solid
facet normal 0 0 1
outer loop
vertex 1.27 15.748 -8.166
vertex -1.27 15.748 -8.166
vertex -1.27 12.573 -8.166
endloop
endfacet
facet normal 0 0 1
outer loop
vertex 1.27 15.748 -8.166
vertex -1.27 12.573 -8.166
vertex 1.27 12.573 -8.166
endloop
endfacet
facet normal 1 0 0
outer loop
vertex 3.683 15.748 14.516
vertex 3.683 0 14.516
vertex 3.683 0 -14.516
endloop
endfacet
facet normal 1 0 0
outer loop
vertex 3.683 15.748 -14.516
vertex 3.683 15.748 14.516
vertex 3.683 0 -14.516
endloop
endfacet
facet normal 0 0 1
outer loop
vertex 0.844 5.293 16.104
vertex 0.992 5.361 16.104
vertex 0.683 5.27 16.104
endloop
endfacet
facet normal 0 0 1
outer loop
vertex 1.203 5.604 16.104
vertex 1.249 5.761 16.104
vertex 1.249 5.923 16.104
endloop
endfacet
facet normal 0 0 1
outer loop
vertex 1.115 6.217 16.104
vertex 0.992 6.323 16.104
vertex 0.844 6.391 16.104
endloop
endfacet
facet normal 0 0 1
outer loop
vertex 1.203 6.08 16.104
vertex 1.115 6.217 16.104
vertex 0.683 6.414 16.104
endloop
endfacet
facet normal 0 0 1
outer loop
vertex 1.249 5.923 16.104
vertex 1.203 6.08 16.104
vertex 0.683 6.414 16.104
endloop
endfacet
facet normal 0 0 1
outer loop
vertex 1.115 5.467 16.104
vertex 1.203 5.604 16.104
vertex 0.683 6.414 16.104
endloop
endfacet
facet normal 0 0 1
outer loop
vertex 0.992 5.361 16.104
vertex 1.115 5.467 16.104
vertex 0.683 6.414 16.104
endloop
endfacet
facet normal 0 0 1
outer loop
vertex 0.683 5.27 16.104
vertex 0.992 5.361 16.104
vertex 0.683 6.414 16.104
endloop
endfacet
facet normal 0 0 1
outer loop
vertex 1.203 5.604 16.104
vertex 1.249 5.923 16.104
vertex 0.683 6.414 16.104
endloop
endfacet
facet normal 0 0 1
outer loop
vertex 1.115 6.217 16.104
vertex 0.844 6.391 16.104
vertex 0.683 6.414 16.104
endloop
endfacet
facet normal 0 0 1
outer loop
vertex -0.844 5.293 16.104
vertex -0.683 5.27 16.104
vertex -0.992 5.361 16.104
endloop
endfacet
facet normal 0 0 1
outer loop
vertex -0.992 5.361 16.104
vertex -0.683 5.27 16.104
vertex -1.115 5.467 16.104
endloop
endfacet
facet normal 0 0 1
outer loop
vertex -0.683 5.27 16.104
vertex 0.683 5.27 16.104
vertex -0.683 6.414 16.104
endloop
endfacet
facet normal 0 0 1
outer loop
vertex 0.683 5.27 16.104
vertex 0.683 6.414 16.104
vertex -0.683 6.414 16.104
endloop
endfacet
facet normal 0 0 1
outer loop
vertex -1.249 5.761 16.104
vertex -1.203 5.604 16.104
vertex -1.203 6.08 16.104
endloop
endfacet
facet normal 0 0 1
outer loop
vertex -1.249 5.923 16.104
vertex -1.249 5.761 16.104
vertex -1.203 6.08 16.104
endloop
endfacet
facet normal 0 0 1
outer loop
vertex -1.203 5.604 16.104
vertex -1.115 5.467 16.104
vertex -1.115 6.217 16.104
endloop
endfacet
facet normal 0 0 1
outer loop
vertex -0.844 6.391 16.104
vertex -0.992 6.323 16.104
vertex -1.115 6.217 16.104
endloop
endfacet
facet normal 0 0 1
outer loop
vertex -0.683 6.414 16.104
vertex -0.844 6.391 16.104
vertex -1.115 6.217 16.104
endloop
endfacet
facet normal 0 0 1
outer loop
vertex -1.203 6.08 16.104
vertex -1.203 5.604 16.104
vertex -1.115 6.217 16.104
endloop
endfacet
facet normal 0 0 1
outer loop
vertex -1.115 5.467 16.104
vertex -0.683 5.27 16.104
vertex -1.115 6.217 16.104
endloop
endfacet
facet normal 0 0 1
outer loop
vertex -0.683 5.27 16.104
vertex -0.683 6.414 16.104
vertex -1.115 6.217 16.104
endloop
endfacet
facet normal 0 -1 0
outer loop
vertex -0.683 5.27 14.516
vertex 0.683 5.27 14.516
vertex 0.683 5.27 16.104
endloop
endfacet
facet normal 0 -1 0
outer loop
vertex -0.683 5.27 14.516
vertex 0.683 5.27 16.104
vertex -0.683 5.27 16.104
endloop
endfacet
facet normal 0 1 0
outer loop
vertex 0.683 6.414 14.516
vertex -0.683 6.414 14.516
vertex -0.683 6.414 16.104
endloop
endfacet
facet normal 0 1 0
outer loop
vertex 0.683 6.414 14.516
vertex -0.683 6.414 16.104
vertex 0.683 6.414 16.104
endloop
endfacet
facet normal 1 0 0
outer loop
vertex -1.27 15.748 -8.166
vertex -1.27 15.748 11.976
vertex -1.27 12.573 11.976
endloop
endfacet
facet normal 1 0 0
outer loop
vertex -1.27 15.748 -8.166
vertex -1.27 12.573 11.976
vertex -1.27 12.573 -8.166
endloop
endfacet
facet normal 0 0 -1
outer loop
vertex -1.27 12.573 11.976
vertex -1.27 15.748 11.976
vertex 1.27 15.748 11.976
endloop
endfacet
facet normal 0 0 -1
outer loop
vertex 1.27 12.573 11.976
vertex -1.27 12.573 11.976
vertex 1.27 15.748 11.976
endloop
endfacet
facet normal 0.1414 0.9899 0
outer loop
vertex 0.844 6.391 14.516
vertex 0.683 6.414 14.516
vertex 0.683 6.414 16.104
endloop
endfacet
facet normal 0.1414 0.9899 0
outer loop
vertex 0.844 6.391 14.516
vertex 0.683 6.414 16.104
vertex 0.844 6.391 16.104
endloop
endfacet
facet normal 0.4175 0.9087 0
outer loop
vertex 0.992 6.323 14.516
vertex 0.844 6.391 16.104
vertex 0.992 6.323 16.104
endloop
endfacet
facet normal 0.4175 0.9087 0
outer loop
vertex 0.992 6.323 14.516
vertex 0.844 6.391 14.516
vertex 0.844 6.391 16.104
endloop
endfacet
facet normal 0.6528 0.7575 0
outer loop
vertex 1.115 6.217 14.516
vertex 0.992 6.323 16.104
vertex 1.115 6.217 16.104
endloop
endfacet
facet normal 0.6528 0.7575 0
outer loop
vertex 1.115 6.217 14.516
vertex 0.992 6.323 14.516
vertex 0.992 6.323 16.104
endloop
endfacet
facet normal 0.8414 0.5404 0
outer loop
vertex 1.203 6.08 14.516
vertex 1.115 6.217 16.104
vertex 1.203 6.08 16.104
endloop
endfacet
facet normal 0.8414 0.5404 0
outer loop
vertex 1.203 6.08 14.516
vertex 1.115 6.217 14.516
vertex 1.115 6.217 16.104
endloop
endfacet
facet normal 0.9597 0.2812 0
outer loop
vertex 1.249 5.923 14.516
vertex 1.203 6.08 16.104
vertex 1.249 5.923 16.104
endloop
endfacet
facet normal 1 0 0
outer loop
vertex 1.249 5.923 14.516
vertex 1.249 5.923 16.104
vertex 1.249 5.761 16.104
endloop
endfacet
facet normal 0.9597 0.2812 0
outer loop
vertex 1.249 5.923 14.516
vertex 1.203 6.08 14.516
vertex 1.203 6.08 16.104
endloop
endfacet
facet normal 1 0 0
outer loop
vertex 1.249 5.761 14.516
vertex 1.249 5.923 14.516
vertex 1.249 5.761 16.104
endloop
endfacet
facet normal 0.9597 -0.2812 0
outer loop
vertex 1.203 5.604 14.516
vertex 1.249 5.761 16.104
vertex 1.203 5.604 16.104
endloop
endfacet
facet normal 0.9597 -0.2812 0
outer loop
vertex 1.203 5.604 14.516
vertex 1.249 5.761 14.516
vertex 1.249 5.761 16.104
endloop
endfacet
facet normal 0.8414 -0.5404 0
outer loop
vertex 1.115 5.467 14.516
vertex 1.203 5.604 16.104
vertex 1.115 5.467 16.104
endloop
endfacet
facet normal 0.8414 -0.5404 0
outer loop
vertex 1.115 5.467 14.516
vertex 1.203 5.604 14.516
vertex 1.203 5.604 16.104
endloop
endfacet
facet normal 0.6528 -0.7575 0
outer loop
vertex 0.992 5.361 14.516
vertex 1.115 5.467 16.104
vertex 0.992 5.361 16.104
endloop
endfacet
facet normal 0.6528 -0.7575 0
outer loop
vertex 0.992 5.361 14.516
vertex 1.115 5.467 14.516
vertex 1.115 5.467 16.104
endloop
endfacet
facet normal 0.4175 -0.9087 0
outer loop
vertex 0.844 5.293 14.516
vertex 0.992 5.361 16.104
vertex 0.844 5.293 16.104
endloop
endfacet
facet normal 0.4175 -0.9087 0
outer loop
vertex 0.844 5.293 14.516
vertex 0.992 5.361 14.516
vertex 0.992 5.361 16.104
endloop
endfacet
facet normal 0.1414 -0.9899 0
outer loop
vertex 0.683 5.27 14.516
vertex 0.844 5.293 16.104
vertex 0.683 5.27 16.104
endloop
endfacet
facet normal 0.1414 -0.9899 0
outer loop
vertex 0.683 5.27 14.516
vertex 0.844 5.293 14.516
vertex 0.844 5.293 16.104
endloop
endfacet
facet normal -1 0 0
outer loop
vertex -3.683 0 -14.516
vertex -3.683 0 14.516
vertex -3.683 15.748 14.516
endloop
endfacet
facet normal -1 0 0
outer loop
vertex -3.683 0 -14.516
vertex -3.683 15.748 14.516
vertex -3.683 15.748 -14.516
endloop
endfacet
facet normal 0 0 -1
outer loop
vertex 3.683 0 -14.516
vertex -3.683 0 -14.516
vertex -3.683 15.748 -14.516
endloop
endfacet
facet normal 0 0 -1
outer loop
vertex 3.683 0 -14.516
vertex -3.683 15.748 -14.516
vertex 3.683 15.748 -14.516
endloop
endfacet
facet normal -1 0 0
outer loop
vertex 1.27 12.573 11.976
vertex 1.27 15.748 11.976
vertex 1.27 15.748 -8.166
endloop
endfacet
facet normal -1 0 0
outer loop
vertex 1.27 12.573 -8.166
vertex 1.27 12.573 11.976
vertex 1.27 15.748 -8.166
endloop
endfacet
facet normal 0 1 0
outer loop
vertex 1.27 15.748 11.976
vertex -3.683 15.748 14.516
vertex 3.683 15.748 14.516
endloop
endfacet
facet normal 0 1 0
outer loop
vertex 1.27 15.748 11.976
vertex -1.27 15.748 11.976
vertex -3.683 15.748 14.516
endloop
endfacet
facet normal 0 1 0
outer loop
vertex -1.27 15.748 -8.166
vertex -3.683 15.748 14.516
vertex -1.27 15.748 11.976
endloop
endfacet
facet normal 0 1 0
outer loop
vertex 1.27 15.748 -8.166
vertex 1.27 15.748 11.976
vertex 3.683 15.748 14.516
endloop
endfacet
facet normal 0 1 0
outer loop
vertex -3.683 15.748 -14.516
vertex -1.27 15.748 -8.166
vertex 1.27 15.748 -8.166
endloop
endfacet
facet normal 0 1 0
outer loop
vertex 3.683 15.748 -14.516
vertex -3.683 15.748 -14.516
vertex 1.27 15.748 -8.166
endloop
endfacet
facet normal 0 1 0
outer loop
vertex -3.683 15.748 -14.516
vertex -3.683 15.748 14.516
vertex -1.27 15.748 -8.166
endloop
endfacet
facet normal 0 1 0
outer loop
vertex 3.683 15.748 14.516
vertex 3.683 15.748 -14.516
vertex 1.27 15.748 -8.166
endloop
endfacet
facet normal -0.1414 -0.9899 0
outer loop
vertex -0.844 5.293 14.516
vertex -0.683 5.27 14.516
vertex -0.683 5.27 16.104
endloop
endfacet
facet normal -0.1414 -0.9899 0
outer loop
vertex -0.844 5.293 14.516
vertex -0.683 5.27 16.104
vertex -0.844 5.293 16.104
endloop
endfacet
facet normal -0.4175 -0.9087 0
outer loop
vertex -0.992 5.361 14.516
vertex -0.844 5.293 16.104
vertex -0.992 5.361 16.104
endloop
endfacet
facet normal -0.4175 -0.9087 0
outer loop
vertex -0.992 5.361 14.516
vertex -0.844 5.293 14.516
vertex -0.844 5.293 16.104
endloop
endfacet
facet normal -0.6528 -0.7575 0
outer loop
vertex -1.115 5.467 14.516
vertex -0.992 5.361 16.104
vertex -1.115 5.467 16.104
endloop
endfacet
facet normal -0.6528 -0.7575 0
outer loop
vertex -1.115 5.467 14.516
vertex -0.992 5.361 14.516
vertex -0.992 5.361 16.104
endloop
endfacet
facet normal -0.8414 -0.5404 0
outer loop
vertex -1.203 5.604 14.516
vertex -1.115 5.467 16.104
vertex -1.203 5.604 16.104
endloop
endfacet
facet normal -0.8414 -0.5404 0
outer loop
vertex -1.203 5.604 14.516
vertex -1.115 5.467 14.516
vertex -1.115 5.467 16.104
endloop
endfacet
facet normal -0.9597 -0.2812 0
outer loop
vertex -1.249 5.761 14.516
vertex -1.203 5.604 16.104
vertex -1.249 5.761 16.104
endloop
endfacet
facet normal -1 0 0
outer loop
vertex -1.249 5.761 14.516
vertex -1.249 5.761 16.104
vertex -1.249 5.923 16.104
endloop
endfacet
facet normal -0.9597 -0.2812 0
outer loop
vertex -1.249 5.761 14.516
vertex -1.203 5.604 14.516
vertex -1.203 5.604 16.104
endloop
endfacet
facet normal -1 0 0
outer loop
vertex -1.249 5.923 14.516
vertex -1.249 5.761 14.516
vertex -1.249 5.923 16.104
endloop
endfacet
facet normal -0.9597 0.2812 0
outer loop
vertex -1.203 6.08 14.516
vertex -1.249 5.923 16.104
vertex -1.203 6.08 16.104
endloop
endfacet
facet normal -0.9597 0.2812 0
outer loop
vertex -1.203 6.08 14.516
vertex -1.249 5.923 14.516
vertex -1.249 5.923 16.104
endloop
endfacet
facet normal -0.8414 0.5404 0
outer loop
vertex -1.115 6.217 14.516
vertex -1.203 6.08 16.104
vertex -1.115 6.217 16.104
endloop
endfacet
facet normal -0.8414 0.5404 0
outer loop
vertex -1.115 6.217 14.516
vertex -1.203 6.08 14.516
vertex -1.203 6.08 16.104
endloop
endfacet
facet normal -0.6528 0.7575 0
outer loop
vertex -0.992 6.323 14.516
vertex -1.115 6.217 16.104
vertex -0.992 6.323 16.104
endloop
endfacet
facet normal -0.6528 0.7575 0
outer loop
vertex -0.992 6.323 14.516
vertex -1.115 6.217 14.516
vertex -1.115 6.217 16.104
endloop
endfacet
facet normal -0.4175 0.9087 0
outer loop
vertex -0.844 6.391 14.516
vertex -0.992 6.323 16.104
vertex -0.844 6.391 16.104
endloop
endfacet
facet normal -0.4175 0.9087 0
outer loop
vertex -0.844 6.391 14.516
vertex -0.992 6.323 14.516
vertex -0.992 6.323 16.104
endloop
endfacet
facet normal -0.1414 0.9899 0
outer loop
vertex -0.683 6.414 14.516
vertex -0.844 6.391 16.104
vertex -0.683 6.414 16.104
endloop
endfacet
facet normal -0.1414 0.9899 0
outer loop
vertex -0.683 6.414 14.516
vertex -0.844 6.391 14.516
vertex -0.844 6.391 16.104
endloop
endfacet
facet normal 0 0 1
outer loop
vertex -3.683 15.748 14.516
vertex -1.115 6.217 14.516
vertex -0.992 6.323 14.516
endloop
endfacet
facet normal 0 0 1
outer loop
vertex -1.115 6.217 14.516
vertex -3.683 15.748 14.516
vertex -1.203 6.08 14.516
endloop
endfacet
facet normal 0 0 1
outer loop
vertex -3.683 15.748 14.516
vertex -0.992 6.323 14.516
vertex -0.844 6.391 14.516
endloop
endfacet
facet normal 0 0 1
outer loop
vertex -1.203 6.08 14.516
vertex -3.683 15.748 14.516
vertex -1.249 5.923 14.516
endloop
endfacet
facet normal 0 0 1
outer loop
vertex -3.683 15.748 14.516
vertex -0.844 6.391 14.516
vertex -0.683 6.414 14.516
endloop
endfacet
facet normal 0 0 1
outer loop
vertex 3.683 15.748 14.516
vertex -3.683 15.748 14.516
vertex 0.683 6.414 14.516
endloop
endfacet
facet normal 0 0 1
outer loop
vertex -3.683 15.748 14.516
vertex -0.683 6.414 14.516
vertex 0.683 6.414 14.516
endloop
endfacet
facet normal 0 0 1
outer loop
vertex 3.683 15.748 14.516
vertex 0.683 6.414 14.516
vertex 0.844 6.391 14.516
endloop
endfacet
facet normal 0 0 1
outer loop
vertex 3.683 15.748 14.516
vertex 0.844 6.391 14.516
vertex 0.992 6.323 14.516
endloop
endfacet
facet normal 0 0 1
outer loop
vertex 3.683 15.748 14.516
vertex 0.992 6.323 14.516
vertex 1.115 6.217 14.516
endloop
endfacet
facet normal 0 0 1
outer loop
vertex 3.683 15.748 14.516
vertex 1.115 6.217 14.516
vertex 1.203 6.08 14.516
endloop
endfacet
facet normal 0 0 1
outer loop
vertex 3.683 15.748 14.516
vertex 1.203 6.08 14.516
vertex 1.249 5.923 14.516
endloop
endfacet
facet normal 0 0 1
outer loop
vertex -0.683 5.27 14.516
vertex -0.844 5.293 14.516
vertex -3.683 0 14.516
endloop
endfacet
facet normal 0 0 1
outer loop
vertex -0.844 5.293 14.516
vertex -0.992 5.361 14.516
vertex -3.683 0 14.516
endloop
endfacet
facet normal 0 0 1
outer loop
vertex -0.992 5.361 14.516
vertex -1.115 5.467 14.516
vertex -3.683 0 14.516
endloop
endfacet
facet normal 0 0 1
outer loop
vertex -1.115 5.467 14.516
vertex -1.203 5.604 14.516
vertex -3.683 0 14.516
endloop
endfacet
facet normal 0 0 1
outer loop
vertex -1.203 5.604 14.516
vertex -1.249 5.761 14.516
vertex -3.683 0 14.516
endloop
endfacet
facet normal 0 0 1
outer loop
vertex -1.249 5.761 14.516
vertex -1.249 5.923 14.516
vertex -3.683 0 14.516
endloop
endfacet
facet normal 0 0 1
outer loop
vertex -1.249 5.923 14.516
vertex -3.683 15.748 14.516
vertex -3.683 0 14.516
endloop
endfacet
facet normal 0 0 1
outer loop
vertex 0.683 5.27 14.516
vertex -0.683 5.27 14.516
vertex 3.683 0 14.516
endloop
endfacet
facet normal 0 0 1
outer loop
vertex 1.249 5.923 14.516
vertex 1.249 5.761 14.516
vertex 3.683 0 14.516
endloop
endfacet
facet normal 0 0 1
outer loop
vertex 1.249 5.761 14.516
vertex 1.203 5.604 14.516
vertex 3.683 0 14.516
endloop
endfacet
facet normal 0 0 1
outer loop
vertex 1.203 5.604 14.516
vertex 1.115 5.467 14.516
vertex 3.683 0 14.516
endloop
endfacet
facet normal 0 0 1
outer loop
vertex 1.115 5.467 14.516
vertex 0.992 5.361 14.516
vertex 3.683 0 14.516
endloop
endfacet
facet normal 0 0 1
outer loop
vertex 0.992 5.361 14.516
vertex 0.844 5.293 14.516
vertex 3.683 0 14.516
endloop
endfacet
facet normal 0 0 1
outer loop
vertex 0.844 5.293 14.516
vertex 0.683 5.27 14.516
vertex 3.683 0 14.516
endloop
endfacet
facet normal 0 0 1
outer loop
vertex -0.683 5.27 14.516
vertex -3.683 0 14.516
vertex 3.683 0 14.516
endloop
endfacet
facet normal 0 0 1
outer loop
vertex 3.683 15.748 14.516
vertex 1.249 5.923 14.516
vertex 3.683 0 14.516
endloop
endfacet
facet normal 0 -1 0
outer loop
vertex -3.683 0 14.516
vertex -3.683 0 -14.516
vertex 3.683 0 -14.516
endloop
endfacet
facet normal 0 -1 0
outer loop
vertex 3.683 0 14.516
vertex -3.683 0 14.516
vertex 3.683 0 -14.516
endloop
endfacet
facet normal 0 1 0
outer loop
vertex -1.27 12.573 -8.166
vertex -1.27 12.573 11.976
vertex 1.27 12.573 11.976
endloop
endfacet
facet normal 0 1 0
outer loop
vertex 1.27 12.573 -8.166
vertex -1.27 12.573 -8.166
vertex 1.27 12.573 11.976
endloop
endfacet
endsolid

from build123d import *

# Parameters (mm, degrees)
SKETCH1_W           = 7.366
SKETCH1_H           = 29.0322
BOSS_EXTRUDE1_DEPTH = 15.748
SKETCH2_W           = 2.54
SKETCH2_H           = 20.1422
CUT_EXTRUDE1_DEPTH  = 3.175
BOSS_EXTRUDE3_DEPTH = 1.5875


with BuildPart() as part:
    # Sketch1 → Boss-Extrude1 (new body)
    with BuildSketch(Plane(origin=(0, 0, 0), x_dir=(1, 0, 0), z_dir=(0, 1, 0))):
        Rectangle(SKETCH1_W, SKETCH1_H)
    extrude(amount=BOSS_EXTRUDE1_DEPTH)

    # Sketch2 → Cut-Extrude1 (cut)
    with BuildSketch(Plane(origin=(0, 15.748, 0), x_dir=(1, 0, 0), z_dir=(0, 1, 0))):
        with Locations((0, -1.905)):
            Rectangle(SKETCH2_W, SKETCH2_H)
    extrude(amount=-CUT_EXTRUDE1_DEPTH, mode=Mode.SUBTRACT)

    # Sketch5 → Boss-Extrude3 (add)
    with BuildSketch(Plane.XY.offset(14.5161)):
        with BuildLine():
            Line((-0.682666257, 6.414003725), (0.682666257, 6.414003725))
            ThreePointArc((0.682666257, 6.414003725), (1.254669982, 5.842), (0.682666257, 5.269996275))
            Line((0.682666257, 5.269996275), (-0.682666257, 5.269996275))
            ThreePointArc((-0.682666257, 5.269996275), (-1.254669982, 5.842), (-0.682666257, 6.414003725))
        make_face()
    extrude(amount=BOSS_EXTRUDE3_DEPTH)


solid = part.part
